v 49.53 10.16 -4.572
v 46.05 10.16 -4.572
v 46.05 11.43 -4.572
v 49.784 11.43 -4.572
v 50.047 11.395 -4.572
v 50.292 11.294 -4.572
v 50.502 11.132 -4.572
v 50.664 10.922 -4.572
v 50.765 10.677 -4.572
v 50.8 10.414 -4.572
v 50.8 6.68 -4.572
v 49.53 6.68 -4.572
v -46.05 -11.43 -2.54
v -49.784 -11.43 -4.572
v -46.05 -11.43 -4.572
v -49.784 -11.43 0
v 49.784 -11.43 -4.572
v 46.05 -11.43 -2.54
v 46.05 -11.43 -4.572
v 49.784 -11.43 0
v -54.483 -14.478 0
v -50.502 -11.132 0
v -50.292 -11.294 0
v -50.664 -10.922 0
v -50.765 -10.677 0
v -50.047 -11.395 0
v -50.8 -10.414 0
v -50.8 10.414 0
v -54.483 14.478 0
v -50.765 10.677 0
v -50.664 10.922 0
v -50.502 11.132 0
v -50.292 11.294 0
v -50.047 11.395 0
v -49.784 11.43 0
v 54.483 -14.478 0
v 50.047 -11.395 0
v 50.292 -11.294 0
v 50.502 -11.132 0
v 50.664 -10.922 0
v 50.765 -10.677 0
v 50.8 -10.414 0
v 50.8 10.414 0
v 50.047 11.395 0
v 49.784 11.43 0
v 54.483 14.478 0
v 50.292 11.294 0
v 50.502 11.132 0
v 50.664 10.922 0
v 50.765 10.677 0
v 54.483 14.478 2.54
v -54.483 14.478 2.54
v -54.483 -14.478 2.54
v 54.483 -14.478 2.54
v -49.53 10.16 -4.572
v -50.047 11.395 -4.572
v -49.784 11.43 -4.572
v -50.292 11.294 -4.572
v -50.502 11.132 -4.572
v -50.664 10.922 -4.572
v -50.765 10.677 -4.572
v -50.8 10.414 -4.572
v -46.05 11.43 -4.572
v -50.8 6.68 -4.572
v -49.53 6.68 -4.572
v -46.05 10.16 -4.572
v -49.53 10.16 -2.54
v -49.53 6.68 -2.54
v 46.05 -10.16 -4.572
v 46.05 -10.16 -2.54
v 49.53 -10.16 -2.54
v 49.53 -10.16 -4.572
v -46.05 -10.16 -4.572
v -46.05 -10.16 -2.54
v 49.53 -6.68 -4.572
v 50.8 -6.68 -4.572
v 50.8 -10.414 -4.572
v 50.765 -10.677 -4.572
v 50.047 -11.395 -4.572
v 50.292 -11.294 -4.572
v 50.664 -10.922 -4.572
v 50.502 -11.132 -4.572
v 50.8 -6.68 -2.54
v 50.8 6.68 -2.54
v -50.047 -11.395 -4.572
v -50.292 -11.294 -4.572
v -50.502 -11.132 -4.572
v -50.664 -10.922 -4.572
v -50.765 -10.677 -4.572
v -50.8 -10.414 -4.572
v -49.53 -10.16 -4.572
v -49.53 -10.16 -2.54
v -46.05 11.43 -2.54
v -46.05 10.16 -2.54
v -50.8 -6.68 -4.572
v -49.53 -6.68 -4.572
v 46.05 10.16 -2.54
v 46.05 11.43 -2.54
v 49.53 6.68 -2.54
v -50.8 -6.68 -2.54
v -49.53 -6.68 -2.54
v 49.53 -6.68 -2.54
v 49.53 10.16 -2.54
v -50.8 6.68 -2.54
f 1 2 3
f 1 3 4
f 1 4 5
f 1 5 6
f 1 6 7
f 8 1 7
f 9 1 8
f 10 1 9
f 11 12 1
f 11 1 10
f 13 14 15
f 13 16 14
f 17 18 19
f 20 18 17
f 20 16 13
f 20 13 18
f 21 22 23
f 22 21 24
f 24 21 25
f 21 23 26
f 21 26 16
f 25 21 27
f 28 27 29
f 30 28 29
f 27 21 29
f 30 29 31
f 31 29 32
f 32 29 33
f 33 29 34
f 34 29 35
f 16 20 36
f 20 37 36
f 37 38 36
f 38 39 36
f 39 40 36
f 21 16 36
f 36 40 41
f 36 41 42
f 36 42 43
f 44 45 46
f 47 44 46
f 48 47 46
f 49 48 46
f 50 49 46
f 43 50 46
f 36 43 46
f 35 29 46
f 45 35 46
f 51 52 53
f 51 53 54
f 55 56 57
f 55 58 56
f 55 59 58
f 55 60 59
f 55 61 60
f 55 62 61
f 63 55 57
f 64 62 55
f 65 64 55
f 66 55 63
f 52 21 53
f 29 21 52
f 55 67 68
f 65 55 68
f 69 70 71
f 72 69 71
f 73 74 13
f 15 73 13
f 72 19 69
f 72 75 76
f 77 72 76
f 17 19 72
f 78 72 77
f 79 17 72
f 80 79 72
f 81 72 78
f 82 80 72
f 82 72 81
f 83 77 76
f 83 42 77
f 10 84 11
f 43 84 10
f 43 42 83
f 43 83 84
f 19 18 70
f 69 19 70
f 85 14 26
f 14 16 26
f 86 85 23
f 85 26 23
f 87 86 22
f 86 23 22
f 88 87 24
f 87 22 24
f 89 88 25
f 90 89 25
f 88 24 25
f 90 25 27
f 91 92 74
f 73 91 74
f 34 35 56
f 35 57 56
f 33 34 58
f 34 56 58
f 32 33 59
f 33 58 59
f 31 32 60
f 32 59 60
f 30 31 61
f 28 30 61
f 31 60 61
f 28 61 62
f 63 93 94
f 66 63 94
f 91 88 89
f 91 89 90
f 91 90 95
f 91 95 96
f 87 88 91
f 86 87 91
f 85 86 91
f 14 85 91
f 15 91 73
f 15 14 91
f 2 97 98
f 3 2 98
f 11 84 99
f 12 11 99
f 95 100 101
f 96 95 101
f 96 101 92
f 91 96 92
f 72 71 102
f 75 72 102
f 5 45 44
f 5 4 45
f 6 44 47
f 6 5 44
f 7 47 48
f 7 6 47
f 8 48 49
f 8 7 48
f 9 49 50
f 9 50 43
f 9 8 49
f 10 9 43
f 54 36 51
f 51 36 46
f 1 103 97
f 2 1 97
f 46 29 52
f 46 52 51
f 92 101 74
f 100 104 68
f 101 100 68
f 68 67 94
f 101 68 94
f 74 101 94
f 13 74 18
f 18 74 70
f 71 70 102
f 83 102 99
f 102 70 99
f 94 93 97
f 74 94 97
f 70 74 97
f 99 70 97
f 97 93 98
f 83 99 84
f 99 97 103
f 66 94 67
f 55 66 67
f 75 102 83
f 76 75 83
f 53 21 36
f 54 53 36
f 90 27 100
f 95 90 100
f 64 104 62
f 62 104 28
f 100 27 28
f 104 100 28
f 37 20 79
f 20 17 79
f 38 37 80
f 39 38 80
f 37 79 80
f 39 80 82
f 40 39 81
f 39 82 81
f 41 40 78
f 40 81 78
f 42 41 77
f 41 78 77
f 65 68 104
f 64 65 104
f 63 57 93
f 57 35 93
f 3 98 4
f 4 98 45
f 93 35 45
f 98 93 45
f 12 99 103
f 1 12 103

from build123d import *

# Parameters (mm, degrees)
F0_W     = 108.966
F0_H     = 28.956
F0_W_2   = 101.6
F0_H_2   = 22.86
F1_DEPTH = 2.54
F2_DEPTH = 2.54
F4_DEPTH = 2.032
F5_R     = 1.016


with BuildPart() as f1:
    # F0 (on Top) → F1 (new body)
    with BuildSketch(Plane.XY):
        Rectangle(F0_W, F0_H)
        Rectangle(F0_W_2, F0_H_2, mode=Mode.SUBTRACT)
        Rectangle(F0_W_2, F0_H_2)
    extrude(amount=F1_DEPTH)

    # F0 (on Top) → F2 (join)
    with BuildSketch(Plane.XY):
        Rectangle(F0_W_2, F0_H_2)
    extrude(amount=-F2_DEPTH)

    # F3 (on face) → F4 (join)
    with BuildSketch(Plane(origin=(0, 0, -2.54), x_dir=(1, 0, 0), z_dir=(0, 0, -1))):
        Polygon((-49.53, -6.6802), (-50.8, -6.6802), (-50.8, -11.43), (-46.0502, -11.43), (-46.0502, -10.16), (-49.53, -10.16), align=None)
        Polygon((50.8, 6.6802), (50.8, 11.43), (46.0502, 11.43), (46.0502, 10.16), (49.53, 10.16), (49.53, 6.6802), align=None)
        Polygon((50.8, -11.43), (50.8, -6.6802), (49.53, -6.6802), (49.53, -10.16), (46.0502, -10.16), (46.0502, -11.43), align=None)
        Polygon((-46.0502, 10.16), (-46.0502, 11.43), (-50.8, 11.43), (-50.8, 6.6802), (-49.53, 6.6802), (-49.53, 10.16), align=None)
    extrude(amount=F4_DEPTH)

    # F5
    f5_edges = [f1.edges().sort_by_distance(p)[0] for p in [
        (-50.8, -11.43, -2.286),
        (-50.8, 11.43, -2.286),
        (50.8, 11.43, -2.286),
        (50.8, -11.43, -2.286),
    ]]
    fillet(f5_edges, radius=F5_R)


solid = f1.part
